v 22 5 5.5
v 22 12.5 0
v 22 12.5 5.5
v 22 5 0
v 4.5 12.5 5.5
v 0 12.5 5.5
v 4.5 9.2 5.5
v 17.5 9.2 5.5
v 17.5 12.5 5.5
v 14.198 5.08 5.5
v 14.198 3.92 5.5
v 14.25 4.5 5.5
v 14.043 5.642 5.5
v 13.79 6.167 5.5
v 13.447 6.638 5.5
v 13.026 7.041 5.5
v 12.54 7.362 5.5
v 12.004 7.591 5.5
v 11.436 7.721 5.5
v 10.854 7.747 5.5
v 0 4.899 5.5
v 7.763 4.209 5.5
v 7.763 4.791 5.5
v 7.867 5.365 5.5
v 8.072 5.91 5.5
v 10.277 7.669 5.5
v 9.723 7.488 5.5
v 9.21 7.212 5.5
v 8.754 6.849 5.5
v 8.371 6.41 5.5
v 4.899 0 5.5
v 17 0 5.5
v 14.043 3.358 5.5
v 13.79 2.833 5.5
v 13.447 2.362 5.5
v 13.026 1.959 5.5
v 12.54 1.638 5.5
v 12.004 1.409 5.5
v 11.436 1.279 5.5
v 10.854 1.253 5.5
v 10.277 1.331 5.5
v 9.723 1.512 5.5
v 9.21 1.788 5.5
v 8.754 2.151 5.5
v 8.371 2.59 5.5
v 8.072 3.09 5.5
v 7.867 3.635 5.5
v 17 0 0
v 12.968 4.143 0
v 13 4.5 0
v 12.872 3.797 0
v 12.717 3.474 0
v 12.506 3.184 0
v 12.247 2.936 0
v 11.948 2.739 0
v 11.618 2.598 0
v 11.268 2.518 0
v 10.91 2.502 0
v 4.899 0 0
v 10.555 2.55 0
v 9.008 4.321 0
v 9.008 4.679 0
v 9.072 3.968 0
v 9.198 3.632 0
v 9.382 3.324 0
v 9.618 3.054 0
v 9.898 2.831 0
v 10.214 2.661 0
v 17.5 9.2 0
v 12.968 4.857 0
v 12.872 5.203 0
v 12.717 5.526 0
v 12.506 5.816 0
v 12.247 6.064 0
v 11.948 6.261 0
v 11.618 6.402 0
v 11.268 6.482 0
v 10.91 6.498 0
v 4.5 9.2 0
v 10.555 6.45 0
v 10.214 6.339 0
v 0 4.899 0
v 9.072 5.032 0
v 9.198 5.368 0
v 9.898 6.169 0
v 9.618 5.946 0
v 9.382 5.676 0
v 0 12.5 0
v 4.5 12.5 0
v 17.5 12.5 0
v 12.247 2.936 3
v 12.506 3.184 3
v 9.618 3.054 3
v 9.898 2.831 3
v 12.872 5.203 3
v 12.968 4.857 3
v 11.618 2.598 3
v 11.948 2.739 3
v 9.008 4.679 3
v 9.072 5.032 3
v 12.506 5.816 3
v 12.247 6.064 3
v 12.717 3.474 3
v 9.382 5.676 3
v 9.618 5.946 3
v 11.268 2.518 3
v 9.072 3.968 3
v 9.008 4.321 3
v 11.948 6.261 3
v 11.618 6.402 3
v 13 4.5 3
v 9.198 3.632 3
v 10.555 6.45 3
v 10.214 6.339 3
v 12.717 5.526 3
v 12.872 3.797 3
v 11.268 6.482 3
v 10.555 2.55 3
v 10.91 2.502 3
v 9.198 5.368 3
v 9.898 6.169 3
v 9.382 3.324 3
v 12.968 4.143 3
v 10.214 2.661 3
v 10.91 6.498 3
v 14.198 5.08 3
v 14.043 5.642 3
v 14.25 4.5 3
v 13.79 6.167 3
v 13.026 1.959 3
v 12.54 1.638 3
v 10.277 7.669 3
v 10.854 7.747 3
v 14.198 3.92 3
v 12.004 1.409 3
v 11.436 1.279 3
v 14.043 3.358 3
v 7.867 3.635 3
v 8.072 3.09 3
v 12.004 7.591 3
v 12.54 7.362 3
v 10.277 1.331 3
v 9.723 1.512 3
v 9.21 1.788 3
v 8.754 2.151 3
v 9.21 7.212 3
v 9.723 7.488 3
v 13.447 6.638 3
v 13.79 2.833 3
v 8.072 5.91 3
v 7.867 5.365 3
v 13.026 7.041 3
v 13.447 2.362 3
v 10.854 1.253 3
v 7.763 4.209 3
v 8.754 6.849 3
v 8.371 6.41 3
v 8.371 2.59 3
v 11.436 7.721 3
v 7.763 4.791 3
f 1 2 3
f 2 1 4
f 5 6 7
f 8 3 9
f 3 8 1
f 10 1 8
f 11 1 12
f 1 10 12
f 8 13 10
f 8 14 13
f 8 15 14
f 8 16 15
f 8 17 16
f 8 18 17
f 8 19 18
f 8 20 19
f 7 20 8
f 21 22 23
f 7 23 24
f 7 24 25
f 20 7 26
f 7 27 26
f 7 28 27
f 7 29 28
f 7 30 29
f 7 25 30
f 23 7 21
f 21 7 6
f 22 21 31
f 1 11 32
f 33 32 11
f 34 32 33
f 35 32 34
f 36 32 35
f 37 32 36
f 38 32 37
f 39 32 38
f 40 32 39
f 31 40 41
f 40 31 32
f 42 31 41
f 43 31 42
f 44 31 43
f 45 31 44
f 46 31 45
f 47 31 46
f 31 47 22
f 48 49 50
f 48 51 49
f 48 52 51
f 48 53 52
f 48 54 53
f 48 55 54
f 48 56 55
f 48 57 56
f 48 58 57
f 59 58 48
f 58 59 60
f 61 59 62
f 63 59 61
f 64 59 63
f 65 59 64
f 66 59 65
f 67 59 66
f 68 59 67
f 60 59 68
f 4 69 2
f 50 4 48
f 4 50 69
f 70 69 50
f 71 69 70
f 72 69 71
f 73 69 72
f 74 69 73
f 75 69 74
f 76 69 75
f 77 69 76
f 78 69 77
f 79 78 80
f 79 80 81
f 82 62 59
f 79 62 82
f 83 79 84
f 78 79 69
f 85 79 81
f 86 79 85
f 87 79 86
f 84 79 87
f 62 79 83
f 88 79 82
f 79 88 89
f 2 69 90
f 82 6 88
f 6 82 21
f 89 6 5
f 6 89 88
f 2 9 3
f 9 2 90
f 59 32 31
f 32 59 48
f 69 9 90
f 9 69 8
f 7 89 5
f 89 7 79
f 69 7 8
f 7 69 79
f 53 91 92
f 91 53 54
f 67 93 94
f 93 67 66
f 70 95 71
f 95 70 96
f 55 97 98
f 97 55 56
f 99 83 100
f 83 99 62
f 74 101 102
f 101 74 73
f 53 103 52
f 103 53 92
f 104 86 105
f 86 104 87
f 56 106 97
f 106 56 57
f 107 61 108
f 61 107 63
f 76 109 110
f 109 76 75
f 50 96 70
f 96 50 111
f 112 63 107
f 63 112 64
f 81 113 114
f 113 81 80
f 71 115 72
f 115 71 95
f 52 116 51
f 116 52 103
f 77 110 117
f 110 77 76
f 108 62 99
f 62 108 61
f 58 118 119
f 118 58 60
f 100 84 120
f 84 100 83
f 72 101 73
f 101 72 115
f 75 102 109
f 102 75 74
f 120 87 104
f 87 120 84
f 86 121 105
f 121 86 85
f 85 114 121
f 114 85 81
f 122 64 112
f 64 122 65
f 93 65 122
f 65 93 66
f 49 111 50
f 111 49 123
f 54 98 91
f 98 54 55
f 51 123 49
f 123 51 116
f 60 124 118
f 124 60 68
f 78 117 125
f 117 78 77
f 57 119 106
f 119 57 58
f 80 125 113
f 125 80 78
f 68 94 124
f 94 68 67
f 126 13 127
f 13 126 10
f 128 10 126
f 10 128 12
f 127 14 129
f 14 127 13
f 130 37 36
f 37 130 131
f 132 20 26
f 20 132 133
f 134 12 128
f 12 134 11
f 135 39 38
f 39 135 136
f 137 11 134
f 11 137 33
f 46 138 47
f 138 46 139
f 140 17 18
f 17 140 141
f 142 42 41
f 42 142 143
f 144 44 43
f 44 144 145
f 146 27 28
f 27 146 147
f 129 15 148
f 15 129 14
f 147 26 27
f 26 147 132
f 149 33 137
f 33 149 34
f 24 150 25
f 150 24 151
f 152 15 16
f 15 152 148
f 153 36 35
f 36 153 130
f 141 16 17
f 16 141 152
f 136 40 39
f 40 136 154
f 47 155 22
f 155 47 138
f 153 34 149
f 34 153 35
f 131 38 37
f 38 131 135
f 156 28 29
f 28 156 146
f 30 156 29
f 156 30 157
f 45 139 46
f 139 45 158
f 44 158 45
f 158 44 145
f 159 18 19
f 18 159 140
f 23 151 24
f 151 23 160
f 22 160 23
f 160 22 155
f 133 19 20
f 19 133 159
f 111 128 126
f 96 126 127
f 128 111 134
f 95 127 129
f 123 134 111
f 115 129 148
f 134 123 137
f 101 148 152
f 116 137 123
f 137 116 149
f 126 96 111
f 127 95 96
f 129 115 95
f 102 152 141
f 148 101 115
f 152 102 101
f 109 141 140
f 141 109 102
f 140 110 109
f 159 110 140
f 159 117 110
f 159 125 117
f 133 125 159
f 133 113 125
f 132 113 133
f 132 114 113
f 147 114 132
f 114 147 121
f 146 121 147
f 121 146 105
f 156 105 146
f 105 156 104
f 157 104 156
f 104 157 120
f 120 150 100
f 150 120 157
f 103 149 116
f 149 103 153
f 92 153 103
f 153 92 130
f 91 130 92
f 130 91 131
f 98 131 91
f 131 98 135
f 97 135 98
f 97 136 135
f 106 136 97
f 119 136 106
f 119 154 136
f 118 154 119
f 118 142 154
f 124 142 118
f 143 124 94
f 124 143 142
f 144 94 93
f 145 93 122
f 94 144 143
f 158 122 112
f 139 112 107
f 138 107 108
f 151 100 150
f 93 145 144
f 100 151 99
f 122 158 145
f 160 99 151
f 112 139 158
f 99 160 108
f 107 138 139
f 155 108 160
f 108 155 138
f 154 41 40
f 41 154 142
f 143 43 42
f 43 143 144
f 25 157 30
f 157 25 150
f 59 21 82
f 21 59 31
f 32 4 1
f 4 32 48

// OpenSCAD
//kossel 2020 linear rail bottom support piece

$fn=35;

width = 22;
rail_width = 13;
screw_head = 6.5;
screw_diameter = 4;

difference(){
    cube([width,12.5,5.5]);
    
    //hole for rail to rest on
    translate([(width-rail_width)/2,9.2,-1])
        cube([rail_width,10,20]);
    
    //screw hole
    translate([11,4.5,-1])
        cylinder(20,d=screw_diameter);
    //screw head hole
    translate([11,4.5,3])
        cylinder(20,d=screw_head);    
    
    translate([0,-5,-1])
    rotate(45) cube([7,15,20]);
 
    mirror([0,1,0])
    translate([width,-5,-1])
    rotate(45) cube([7,15,20]);
    }
